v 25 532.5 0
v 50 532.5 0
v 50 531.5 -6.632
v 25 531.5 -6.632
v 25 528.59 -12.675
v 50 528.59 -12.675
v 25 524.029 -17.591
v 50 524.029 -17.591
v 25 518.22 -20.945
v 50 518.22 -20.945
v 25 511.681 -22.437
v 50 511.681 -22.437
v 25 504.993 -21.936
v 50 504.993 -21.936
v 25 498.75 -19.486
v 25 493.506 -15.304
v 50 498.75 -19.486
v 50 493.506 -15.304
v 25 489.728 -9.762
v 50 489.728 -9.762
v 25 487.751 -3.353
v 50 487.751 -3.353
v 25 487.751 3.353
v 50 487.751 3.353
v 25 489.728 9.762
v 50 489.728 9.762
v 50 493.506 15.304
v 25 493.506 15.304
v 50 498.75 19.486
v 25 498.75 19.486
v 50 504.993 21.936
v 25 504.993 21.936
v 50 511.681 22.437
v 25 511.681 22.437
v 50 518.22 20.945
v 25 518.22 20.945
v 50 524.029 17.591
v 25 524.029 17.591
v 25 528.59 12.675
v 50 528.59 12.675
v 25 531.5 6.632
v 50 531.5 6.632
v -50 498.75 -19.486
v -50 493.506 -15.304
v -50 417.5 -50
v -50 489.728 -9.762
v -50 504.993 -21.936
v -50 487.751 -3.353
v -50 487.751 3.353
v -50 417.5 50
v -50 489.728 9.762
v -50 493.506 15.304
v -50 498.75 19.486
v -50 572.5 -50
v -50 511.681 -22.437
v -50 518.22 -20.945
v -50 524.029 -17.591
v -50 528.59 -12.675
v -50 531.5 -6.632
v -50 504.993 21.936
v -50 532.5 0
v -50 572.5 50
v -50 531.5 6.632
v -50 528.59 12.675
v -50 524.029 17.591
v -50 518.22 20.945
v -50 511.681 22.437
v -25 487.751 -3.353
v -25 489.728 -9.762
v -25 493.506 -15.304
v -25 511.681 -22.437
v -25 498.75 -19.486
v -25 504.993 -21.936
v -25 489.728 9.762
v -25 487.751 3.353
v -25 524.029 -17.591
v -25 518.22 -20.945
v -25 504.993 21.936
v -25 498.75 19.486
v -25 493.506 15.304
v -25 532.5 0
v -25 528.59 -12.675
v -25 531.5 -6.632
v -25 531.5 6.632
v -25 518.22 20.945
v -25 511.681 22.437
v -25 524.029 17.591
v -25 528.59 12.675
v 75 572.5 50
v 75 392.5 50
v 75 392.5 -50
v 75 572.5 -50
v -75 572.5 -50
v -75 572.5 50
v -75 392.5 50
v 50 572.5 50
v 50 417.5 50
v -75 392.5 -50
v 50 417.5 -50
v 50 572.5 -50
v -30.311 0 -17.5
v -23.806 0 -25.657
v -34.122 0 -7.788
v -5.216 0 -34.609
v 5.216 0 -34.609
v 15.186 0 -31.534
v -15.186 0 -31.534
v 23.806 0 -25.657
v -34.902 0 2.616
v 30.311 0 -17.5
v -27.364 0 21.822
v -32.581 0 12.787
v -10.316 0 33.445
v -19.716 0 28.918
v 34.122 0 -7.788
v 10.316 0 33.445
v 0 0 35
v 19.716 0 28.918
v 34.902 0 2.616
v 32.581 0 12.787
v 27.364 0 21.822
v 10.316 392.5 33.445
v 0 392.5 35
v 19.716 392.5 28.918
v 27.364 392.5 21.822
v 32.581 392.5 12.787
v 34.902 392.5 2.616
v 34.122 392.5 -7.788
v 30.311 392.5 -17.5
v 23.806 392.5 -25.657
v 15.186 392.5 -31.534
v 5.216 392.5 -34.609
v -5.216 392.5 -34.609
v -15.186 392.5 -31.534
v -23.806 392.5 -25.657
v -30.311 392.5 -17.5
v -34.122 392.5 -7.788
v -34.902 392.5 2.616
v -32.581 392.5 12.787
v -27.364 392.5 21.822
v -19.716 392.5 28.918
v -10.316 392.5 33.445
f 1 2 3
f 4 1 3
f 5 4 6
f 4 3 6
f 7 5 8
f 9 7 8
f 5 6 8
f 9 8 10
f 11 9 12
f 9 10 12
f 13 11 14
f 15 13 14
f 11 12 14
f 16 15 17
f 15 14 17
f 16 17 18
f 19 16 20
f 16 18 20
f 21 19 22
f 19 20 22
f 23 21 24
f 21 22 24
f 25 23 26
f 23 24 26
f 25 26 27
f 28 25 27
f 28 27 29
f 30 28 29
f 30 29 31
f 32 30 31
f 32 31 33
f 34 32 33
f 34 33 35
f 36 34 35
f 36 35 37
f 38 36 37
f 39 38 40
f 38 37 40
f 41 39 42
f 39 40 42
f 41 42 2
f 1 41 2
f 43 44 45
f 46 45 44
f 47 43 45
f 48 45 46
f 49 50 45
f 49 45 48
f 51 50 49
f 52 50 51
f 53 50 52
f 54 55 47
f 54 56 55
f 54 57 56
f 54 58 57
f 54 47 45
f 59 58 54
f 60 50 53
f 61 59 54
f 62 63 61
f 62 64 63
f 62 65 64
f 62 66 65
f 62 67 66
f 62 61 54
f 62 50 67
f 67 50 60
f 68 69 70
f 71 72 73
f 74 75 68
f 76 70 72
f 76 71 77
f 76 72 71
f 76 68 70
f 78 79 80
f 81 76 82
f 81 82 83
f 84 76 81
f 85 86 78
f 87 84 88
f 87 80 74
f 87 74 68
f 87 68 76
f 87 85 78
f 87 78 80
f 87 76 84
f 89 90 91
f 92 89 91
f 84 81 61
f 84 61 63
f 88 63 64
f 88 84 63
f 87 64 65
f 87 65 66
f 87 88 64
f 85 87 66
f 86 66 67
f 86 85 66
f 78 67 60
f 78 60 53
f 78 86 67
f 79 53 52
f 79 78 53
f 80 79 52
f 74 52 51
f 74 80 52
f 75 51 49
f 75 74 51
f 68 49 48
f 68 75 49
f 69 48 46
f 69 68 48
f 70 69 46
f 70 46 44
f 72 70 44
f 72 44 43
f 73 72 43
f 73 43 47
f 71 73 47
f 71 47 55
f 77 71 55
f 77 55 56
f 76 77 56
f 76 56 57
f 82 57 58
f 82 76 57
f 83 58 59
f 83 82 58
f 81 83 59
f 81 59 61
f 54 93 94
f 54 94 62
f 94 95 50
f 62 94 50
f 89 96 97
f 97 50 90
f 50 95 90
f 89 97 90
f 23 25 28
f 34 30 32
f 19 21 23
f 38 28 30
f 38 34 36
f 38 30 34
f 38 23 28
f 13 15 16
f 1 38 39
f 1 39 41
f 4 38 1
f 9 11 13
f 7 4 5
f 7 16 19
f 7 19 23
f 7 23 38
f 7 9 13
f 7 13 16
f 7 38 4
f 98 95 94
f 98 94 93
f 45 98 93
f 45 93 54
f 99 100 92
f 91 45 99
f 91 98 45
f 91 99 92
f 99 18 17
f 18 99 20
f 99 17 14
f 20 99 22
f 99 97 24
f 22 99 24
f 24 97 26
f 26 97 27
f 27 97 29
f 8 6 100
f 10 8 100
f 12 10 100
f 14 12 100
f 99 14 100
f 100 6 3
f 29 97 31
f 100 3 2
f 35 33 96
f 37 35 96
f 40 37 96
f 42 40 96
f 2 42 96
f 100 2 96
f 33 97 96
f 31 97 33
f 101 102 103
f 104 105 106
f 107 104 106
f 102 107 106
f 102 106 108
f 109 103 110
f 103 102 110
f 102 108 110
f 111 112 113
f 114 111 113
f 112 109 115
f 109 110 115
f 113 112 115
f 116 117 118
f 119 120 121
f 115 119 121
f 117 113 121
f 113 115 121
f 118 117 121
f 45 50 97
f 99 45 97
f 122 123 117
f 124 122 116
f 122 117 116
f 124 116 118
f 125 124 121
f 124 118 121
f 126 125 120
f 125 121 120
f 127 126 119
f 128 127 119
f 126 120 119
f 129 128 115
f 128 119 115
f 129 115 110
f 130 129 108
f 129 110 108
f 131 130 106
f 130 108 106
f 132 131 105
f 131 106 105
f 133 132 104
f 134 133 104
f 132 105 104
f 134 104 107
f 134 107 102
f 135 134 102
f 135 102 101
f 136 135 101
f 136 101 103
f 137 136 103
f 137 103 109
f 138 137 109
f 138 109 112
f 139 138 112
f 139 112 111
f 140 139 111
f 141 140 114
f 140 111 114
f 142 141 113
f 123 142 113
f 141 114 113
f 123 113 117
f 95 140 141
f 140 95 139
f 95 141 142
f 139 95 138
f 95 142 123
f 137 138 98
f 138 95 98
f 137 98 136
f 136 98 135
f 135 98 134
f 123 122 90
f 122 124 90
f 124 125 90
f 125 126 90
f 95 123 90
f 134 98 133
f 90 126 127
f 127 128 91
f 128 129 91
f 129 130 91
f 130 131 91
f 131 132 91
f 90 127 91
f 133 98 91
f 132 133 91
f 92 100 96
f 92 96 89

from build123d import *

# Parameters (mm, degrees)
SKETCH1_R           = 35
BOSS_EXTRUDE1_DEPTH = 392.5
SKETCH2_W           = 150
SKETCH2_H           = 100
BOSS_EXTRUDE2_DEPTH = 180
SKETCH3_W           = 100
SKETCH3_H           = 125
CUT_EXTRUDE1_DEPTH  = 150
SKETCH4_R           = 22.5
BOSS_EXTRUDE3_DEPTH = 25
BOSS_EXTRUDE4_START = 25
SKETCH5_R           = 22.5
BOSS_EXTRUDE4_DEPTH = 25
SKETCH6_W           = 100
SKETCH6_H           = 30
CUT_EXTRUDE2_DEPTH  = 586.987414541


with BuildPart() as part:
    # Sketch1 → Boss-Extrude1 (new body)
    with BuildSketch(Plane(origin=(0, 0, 0), x_dir=(1, 0, 0), z_dir=(0, 1, 0))):
        with Locations(Location((0, 0, 0), (0, 0, 270))):
            Circle(SKETCH1_R)
    extrude(amount=BOSS_EXTRUDE1_DEPTH)

    # Sketch2 → Boss-Extrude2 (add)
    with BuildSketch(Plane(origin=(0, 392.5, 0), x_dir=(1, 0, 0), z_dir=(0, 1, 0))):
        Rectangle(SKETCH2_W, SKETCH2_H)
    extrude(amount=BOSS_EXTRUDE2_DEPTH)

    # Sketch3 → Cut-Extrude1 (cut)
    with BuildSketch(Plane.XY.offset(50)):
        with Locations((0, 510)):
            Rectangle(SKETCH3_W, SKETCH3_H)
    extrude(amount=-CUT_EXTRUDE1_DEPTH, mode=Mode.SUBTRACT)

    # Sketch4 → Boss-Extrude3 (add)
    with BuildSketch(Plane.ZY.offset(-50)):
        with Locations(Location((0, 510, 0), (0, 0, 90))):
            Circle(SKETCH4_R)
    extrude(amount=BOSS_EXTRUDE3_DEPTH)

    # Sketch5 → Boss-Extrude4 (add)
    with BuildSketch(Plane(origin=(-50, 0, 0), x_dir=(0, 0, -1), z_dir=(1, 0, 0)).offset(BOSS_EXTRUDE4_START)):
        with Locations(Location((0, 510, 0), (0, 0, 90))):
            Circle(SKETCH5_R)
    extrude(amount=-BOSS_EXTRUDE4_DEPTH)

    # Sketch6 → Cut-Extrude2 (cut, through all)
    with BuildSketch(Plane.XY.offset(50)):
        with Locations((0, 432.5)):
            Rectangle(SKETCH6_W, SKETCH6_H)
    extrude(amount=-CUT_EXTRUDE2_DEPTH, mode=Mode.SUBTRACT)


solid = part.part
